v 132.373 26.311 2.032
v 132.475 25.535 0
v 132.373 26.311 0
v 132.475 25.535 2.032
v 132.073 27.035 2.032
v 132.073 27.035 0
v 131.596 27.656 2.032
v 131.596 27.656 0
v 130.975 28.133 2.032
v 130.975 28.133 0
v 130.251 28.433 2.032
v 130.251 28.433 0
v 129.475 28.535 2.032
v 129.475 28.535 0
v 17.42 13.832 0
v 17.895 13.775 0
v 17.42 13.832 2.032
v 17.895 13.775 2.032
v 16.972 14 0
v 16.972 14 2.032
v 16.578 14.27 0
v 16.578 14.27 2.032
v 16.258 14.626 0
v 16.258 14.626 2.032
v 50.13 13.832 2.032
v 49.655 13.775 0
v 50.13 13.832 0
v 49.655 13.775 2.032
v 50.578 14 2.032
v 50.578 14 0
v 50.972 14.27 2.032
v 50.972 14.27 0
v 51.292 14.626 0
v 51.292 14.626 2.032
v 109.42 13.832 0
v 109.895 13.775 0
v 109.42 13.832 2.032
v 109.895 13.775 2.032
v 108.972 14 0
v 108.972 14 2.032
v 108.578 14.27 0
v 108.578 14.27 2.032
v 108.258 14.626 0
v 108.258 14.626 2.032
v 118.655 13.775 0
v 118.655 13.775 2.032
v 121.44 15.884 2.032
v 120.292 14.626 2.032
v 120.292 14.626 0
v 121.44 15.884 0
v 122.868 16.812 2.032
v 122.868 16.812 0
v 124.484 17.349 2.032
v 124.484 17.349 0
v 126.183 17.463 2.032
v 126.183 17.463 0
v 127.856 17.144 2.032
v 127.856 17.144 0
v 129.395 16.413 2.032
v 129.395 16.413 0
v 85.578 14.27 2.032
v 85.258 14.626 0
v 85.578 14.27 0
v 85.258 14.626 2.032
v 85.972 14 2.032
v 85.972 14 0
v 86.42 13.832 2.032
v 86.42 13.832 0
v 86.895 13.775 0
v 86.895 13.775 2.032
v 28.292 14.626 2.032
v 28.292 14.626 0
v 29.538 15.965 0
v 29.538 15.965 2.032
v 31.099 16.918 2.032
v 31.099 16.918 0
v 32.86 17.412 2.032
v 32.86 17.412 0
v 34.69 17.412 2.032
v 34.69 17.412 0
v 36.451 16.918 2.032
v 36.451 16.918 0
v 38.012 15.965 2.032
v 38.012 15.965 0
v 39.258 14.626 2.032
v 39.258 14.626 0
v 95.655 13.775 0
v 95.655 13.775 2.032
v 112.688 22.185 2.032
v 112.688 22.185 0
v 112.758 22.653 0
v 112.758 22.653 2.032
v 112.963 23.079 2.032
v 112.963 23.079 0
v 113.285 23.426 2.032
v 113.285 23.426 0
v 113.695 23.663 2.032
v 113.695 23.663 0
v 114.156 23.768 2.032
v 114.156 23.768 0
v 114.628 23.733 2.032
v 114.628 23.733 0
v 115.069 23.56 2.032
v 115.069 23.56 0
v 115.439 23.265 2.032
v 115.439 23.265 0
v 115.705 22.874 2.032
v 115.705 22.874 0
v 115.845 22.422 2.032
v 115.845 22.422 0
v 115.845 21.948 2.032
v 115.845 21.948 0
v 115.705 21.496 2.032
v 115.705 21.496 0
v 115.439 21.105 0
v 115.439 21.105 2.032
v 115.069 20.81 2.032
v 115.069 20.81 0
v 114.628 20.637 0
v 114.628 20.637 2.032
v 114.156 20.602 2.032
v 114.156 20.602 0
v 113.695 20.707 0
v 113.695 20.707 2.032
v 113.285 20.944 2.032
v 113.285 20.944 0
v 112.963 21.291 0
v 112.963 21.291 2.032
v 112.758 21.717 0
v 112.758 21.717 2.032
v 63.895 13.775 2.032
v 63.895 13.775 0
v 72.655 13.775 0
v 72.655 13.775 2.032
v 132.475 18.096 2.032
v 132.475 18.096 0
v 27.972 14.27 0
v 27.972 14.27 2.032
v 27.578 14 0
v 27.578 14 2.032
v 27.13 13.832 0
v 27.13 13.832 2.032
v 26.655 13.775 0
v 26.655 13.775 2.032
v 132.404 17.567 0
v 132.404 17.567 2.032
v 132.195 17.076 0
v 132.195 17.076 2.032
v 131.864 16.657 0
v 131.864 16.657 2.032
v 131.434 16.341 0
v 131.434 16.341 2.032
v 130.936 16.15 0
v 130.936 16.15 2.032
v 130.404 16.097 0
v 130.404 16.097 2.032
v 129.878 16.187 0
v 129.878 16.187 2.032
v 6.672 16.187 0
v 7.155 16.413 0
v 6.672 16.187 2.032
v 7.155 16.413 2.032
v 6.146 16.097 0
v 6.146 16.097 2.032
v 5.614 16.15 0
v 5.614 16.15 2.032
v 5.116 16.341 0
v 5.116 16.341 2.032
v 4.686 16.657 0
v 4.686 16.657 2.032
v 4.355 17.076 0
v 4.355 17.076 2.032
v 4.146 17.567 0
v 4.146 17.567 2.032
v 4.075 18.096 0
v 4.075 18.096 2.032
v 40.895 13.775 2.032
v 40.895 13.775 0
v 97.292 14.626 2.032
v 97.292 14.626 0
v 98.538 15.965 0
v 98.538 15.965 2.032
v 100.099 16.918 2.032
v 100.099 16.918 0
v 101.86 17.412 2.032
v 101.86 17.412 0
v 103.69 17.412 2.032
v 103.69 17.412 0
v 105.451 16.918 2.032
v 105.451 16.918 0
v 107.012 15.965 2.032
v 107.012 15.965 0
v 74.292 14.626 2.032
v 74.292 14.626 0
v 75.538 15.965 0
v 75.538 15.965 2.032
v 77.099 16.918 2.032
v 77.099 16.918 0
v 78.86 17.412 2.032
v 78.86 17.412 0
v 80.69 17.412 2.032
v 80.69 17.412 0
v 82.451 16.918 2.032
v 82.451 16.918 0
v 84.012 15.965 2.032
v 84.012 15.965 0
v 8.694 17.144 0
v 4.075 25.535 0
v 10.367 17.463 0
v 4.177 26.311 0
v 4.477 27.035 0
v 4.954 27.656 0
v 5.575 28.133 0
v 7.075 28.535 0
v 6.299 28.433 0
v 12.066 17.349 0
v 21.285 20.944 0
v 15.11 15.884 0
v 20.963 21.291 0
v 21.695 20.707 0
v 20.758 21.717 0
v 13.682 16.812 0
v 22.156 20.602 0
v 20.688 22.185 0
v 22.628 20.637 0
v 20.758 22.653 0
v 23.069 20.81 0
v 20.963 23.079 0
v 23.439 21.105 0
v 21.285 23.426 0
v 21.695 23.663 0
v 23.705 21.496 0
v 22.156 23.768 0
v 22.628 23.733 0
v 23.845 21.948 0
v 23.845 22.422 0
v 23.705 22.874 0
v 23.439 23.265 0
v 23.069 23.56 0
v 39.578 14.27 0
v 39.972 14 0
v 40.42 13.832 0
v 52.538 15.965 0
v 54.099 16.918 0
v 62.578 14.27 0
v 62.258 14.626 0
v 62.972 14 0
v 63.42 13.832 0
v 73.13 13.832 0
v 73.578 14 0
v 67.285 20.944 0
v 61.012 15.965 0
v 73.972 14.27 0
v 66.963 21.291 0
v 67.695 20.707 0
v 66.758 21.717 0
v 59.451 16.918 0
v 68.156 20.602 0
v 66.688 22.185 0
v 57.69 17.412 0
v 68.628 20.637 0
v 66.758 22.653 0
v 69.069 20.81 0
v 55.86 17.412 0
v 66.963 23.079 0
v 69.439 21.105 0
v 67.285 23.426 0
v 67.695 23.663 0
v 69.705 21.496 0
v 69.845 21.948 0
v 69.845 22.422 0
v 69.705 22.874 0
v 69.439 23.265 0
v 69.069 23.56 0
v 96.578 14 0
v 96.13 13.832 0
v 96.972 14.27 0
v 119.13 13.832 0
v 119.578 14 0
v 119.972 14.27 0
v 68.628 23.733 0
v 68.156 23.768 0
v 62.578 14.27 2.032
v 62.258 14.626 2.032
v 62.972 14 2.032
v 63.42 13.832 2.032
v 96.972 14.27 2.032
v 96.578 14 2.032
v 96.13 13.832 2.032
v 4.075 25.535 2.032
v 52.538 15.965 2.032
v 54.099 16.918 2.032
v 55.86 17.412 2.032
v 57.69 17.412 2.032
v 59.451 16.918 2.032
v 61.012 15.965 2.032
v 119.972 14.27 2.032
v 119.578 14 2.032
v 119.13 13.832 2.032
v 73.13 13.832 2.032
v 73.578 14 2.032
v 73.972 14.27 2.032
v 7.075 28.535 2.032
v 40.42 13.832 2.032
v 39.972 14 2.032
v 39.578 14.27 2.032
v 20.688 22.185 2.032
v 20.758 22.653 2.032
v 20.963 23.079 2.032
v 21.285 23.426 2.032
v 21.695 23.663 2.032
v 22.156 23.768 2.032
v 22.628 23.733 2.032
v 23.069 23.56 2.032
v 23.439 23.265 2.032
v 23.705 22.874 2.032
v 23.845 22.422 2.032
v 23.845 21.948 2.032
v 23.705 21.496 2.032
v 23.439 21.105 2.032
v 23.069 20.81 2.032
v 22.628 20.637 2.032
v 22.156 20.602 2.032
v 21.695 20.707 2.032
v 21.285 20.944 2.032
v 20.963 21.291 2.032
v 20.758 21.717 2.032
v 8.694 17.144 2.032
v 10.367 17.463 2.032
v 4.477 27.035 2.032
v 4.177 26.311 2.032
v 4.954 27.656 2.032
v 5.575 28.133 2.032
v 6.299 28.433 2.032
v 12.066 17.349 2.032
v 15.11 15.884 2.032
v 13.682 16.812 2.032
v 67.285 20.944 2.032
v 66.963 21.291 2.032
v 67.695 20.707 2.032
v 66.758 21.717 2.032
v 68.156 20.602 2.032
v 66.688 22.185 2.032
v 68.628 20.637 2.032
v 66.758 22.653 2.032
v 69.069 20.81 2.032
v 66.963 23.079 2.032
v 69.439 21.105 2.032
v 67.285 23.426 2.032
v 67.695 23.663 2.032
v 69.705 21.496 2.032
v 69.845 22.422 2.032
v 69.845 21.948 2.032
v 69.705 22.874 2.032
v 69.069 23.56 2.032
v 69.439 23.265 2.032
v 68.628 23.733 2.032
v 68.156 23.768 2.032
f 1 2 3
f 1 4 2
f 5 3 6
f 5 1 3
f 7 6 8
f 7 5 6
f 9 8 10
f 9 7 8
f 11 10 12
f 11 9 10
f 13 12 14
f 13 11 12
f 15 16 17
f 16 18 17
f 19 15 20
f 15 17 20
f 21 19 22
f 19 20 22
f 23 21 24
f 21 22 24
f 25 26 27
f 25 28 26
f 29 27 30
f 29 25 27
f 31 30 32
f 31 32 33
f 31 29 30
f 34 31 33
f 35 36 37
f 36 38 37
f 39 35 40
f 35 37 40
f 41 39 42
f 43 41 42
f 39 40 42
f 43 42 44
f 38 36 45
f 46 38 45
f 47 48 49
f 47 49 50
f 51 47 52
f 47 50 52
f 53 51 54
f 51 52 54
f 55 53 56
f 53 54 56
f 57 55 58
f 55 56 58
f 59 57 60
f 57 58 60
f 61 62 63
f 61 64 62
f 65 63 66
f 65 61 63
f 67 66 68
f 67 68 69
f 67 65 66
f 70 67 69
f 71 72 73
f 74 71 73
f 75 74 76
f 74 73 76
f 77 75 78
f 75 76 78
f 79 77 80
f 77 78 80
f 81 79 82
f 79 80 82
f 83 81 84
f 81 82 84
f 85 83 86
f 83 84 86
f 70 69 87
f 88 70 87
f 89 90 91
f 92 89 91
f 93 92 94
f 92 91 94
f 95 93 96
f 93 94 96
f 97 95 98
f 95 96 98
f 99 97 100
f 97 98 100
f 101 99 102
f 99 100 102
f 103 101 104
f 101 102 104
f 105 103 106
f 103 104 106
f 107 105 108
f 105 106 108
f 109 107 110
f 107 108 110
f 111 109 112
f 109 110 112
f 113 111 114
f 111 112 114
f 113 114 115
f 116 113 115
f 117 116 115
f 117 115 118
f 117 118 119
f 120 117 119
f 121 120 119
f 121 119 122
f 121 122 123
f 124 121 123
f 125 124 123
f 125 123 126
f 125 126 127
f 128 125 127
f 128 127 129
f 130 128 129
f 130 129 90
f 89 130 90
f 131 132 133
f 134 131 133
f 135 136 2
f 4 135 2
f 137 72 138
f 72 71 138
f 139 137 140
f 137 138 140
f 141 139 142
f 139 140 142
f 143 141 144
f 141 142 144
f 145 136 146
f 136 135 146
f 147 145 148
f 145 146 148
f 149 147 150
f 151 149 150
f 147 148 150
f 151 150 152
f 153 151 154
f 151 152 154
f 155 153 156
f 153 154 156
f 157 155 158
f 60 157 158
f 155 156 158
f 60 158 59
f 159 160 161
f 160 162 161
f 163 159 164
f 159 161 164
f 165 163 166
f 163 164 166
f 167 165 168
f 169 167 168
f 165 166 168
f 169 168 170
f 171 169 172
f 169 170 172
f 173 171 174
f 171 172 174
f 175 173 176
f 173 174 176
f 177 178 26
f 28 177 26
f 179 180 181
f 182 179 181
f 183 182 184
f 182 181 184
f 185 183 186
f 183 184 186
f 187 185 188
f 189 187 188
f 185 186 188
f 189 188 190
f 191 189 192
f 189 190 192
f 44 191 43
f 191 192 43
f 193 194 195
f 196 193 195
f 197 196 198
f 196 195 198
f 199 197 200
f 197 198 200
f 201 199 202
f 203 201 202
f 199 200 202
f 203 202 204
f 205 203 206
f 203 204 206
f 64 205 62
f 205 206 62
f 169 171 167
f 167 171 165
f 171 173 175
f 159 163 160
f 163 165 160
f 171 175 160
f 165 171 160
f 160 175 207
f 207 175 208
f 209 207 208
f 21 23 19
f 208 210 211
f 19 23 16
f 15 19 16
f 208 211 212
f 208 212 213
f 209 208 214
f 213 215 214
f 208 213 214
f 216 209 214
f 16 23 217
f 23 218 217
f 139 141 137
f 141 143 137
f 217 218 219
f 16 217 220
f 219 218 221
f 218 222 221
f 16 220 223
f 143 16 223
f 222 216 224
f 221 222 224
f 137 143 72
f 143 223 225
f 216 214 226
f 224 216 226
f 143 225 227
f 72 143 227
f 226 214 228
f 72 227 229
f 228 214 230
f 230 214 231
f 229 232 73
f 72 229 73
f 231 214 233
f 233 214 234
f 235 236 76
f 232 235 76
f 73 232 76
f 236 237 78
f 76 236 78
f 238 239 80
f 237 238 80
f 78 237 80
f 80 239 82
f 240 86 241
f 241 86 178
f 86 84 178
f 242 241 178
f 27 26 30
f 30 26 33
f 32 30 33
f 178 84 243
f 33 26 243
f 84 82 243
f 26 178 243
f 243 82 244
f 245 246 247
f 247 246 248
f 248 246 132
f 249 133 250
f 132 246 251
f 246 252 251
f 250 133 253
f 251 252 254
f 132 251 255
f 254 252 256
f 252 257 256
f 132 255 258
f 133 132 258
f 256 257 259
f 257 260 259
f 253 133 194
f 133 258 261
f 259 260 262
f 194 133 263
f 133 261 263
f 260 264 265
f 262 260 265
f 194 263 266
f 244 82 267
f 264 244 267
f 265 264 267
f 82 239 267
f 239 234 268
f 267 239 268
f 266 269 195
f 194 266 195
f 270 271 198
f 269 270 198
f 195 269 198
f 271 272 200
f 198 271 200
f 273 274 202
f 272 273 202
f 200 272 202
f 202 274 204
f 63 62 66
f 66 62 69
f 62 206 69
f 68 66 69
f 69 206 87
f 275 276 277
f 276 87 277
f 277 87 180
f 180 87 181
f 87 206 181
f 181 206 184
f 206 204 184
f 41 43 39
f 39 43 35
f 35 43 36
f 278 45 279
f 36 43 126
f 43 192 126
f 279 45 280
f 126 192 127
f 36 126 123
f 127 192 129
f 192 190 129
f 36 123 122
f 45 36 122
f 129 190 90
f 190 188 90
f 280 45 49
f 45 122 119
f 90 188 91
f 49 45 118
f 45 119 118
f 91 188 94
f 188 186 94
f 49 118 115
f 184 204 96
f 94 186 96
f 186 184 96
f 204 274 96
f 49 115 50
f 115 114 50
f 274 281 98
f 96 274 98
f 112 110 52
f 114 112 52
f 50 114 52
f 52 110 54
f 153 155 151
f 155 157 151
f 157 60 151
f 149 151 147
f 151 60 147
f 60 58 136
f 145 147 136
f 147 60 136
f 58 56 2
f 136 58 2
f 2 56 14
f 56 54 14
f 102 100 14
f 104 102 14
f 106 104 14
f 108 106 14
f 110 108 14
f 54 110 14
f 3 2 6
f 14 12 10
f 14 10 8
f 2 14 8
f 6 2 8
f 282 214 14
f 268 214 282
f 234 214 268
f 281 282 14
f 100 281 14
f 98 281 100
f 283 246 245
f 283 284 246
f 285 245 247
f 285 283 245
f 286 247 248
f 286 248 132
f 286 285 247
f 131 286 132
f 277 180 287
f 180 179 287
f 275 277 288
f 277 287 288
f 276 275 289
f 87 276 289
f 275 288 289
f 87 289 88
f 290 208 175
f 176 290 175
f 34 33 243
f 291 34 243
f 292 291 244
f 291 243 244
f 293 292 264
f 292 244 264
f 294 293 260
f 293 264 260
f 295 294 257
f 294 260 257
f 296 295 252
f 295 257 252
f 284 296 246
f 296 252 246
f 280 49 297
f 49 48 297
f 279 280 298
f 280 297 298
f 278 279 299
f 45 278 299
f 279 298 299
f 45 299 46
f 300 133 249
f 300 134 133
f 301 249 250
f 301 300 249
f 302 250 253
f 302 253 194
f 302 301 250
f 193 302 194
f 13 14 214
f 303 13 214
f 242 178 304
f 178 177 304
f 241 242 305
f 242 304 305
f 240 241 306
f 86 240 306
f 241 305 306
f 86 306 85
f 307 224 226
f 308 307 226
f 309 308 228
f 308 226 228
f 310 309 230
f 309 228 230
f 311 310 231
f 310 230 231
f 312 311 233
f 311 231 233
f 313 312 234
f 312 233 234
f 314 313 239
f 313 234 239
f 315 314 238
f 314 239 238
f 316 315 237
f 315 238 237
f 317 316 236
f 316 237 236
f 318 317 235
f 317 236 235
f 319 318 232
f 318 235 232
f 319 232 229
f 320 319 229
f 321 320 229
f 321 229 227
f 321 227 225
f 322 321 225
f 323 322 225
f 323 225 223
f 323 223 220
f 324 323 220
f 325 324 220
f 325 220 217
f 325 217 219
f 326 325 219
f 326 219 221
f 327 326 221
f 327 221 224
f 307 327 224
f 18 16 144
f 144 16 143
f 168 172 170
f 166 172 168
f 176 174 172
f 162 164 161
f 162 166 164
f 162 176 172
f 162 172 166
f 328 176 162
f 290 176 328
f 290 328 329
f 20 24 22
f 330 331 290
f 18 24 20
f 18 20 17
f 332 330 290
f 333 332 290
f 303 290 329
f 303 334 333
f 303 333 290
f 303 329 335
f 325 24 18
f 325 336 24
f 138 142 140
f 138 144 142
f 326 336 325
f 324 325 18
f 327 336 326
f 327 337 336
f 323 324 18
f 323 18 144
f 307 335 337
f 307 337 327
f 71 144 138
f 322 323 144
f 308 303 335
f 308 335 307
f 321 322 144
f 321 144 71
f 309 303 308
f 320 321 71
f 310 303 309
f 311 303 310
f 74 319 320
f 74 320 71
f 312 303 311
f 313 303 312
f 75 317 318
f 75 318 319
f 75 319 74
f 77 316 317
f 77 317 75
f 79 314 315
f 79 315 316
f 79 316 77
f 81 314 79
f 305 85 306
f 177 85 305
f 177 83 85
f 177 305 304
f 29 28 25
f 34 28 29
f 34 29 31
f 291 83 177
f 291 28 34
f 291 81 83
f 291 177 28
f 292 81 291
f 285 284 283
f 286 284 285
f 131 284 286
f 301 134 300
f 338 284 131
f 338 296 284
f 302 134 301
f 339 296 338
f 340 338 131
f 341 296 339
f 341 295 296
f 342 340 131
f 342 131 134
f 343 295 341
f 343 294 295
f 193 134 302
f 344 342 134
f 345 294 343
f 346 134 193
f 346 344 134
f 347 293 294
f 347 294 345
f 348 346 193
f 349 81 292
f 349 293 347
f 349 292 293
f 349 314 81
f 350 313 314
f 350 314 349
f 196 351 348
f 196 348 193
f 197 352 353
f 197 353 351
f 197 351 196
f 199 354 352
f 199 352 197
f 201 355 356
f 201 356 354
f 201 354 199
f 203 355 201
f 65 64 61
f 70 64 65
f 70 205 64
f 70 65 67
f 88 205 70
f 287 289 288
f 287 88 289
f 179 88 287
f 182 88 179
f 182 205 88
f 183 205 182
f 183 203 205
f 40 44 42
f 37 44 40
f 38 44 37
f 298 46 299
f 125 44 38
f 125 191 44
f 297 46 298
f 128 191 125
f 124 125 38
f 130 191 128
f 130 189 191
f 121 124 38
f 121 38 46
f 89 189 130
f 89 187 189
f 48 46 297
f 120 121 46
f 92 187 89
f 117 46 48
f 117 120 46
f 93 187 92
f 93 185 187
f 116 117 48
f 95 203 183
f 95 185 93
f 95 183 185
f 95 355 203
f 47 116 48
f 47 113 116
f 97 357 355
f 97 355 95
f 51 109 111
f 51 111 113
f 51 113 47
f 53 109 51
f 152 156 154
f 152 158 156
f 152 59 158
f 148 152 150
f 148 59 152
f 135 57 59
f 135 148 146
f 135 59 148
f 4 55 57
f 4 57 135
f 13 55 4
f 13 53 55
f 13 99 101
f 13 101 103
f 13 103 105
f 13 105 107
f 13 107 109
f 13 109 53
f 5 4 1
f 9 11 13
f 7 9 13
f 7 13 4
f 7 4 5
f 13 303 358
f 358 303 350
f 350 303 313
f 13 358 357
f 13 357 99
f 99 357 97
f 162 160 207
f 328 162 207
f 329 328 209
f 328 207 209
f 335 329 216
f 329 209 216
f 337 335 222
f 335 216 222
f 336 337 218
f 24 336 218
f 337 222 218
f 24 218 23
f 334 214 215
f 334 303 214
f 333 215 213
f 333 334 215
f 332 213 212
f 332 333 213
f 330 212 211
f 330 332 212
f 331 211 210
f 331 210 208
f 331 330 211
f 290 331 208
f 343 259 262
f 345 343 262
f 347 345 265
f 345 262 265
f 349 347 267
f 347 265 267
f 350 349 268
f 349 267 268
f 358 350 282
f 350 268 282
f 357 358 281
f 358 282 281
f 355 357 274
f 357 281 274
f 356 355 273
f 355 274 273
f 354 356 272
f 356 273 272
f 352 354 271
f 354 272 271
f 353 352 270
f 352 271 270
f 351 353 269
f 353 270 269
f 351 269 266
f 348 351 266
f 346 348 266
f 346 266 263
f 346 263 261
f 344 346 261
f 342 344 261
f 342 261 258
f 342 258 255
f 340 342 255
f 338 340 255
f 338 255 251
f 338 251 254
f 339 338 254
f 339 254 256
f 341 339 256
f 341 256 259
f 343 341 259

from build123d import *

# Parameters (mm, degrees)
BOSS_EXTRUDE1_DEPTH = 2.032
FILLET1_R           = 3
FILLET2_R           = 2
SKETCH4_R           = 1.5875
CUT_EXTRUDE1_DEPTH  = 136.528598113


with BuildPart() as part:
    # Sketch3 → Boss-Extrude1 (new body)
    with BuildSketch(Plane.XY):
        with BuildLine():
            ThreePointArc((4.075, 10.775), (9.233659082, 17.295296632), (16.76582632, 13.775))
            Line((16.76582632, 13.775), (27.78417368, 13.775))
            ThreePointArc((27.78417368, 13.775), (33.775, 17.475), (39.76582632, 13.775))
            Line((39.76582632, 13.775), (50.78417368, 13.775))
            ThreePointArc((50.78417368, 13.775), (56.775, 17.475), (62.76582632, 13.775))
            Line((62.76582632, 13.775), (73.78417368, 13.775))
            ThreePointArc((73.78417368, 13.775), (79.775, 17.475), (85.76582632, 13.775))
            Line((85.76582632, 13.775), (96.78417368, 13.775))
            ThreePointArc((96.78417368, 13.775), (102.775, 17.475), (108.76582632, 13.775))
            Line((108.76582632, 13.775), (119.78417368, 13.775))
            ThreePointArc((119.78417368, 13.775), (127.316340918, 17.295296632), (132.475, 10.775))
            Line((132.475, 10.775), (132.475, 28.535))
            Line((132.475, 28.535), (4.075, 28.535))
            Line((4.075, 28.535), (4.075, 10.775))
        make_face()
    extrude(amount=BOSS_EXTRUDE1_DEPTH)

    # Fillet1
    fillet1_edges = [part.edges().sort_by_distance(p)[0] for p in [
        (4.075, 28.535, 1.016),
        (132.475, 28.535, 1.016),
    ]]
    fillet(fillet1_edges, radius=FILLET1_R)

    # Fillet2
    fillet2_edges = [part.edges().sort_by_distance(p)[0] for p in [
        (119.78417368, 13.775, 1.016),
    ]]
    fillet(fillet2_edges, radius=FILLET2_R)
    fillet2_2_edges = [part.edges().sort_by_distance(p)[0] for p in [
        (108.76582632, 13.775, 1.016),
    ]]
    fillet(fillet2_2_edges, radius=FILLET2_R)
    fillet2_3_edges = [part.edges().sort_by_distance(p)[0] for p in [
        (96.78417368, 13.775, 1.016),
    ]]
    fillet(fillet2_3_edges, radius=FILLET2_R)
    fillet2_4_edges = [part.edges().sort_by_distance(p)[0] for p in [
        (4.075, 10.775, 1.016),
    ]]
    fillet(fillet2_4_edges, radius=FILLET2_R)
    fillet2_5_edges = [part.edges().sort_by_distance(p)[0] for p in [
        (85.76582632, 13.775, 1.016),
    ]]
    fillet(fillet2_5_edges, radius=FILLET2_R)
    fillet2_6_edges = [part.edges().sort_by_distance(p)[0] for p in [
        (16.76582632, 13.775, 1.016),
    ]]
    fillet(fillet2_6_edges, radius=FILLET2_R)
    fillet2_7_edges = [part.edges().sort_by_distance(p)[0] for p in [
        (73.78417368, 13.775, 1.016),
    ]]
    fillet(fillet2_7_edges, radius=FILLET2_R)
    fillet2_8_edges = [part.edges().sort_by_distance(p)[0] for p in [
        (27.78417368, 13.775, 1.016),
    ]]
    fillet(fillet2_8_edges, radius=FILLET2_R)
    fillet2_9_edges = [part.edges().sort_by_distance(p)[0] for p in [
        (62.76582632, 13.775, 1.016),
    ]]
    fillet(fillet2_9_edges, radius=FILLET2_R)
    fillet2_10_edges = [part.edges().sort_by_distance(p)[0] for p in [
        (39.76582632, 13.775, 1.016),
    ]]
    fillet(fillet2_10_edges, radius=FILLET2_R)
    fillet2_11_edges = [part.edges().sort_by_distance(p)[0] for p in [
        (50.78417368, 13.775, 1.016),
    ]]
    fillet(fillet2_11_edges, radius=FILLET2_R)
    fillet2_12_edges = [part.edges().sort_by_distance(p)[0] for p in [
        (132.475, 10.775, 1.016),
    ]]
    fillet(fillet2_12_edges, radius=FILLET2_R)

    # Sketch4 → Cut-Extrude1 (cut, through all)
    with BuildSketch(Plane(origin=(0, 0, 0), x_dir=(-1, 0, 0), z_dir=(0, 0, -1))):
        with Locations((-22.275, 22.185)):
            Circle(SKETCH4_R)
        with Locations((-68.275, 22.185)):
            Circle(SKETCH4_R)
        with Locations((-114.275, 22.185)):
            Circle(SKETCH4_R)
    extrude(amount=-CUT_EXTRUDE1_DEPTH, mode=Mode.SUBTRACT)


solid = part.part
